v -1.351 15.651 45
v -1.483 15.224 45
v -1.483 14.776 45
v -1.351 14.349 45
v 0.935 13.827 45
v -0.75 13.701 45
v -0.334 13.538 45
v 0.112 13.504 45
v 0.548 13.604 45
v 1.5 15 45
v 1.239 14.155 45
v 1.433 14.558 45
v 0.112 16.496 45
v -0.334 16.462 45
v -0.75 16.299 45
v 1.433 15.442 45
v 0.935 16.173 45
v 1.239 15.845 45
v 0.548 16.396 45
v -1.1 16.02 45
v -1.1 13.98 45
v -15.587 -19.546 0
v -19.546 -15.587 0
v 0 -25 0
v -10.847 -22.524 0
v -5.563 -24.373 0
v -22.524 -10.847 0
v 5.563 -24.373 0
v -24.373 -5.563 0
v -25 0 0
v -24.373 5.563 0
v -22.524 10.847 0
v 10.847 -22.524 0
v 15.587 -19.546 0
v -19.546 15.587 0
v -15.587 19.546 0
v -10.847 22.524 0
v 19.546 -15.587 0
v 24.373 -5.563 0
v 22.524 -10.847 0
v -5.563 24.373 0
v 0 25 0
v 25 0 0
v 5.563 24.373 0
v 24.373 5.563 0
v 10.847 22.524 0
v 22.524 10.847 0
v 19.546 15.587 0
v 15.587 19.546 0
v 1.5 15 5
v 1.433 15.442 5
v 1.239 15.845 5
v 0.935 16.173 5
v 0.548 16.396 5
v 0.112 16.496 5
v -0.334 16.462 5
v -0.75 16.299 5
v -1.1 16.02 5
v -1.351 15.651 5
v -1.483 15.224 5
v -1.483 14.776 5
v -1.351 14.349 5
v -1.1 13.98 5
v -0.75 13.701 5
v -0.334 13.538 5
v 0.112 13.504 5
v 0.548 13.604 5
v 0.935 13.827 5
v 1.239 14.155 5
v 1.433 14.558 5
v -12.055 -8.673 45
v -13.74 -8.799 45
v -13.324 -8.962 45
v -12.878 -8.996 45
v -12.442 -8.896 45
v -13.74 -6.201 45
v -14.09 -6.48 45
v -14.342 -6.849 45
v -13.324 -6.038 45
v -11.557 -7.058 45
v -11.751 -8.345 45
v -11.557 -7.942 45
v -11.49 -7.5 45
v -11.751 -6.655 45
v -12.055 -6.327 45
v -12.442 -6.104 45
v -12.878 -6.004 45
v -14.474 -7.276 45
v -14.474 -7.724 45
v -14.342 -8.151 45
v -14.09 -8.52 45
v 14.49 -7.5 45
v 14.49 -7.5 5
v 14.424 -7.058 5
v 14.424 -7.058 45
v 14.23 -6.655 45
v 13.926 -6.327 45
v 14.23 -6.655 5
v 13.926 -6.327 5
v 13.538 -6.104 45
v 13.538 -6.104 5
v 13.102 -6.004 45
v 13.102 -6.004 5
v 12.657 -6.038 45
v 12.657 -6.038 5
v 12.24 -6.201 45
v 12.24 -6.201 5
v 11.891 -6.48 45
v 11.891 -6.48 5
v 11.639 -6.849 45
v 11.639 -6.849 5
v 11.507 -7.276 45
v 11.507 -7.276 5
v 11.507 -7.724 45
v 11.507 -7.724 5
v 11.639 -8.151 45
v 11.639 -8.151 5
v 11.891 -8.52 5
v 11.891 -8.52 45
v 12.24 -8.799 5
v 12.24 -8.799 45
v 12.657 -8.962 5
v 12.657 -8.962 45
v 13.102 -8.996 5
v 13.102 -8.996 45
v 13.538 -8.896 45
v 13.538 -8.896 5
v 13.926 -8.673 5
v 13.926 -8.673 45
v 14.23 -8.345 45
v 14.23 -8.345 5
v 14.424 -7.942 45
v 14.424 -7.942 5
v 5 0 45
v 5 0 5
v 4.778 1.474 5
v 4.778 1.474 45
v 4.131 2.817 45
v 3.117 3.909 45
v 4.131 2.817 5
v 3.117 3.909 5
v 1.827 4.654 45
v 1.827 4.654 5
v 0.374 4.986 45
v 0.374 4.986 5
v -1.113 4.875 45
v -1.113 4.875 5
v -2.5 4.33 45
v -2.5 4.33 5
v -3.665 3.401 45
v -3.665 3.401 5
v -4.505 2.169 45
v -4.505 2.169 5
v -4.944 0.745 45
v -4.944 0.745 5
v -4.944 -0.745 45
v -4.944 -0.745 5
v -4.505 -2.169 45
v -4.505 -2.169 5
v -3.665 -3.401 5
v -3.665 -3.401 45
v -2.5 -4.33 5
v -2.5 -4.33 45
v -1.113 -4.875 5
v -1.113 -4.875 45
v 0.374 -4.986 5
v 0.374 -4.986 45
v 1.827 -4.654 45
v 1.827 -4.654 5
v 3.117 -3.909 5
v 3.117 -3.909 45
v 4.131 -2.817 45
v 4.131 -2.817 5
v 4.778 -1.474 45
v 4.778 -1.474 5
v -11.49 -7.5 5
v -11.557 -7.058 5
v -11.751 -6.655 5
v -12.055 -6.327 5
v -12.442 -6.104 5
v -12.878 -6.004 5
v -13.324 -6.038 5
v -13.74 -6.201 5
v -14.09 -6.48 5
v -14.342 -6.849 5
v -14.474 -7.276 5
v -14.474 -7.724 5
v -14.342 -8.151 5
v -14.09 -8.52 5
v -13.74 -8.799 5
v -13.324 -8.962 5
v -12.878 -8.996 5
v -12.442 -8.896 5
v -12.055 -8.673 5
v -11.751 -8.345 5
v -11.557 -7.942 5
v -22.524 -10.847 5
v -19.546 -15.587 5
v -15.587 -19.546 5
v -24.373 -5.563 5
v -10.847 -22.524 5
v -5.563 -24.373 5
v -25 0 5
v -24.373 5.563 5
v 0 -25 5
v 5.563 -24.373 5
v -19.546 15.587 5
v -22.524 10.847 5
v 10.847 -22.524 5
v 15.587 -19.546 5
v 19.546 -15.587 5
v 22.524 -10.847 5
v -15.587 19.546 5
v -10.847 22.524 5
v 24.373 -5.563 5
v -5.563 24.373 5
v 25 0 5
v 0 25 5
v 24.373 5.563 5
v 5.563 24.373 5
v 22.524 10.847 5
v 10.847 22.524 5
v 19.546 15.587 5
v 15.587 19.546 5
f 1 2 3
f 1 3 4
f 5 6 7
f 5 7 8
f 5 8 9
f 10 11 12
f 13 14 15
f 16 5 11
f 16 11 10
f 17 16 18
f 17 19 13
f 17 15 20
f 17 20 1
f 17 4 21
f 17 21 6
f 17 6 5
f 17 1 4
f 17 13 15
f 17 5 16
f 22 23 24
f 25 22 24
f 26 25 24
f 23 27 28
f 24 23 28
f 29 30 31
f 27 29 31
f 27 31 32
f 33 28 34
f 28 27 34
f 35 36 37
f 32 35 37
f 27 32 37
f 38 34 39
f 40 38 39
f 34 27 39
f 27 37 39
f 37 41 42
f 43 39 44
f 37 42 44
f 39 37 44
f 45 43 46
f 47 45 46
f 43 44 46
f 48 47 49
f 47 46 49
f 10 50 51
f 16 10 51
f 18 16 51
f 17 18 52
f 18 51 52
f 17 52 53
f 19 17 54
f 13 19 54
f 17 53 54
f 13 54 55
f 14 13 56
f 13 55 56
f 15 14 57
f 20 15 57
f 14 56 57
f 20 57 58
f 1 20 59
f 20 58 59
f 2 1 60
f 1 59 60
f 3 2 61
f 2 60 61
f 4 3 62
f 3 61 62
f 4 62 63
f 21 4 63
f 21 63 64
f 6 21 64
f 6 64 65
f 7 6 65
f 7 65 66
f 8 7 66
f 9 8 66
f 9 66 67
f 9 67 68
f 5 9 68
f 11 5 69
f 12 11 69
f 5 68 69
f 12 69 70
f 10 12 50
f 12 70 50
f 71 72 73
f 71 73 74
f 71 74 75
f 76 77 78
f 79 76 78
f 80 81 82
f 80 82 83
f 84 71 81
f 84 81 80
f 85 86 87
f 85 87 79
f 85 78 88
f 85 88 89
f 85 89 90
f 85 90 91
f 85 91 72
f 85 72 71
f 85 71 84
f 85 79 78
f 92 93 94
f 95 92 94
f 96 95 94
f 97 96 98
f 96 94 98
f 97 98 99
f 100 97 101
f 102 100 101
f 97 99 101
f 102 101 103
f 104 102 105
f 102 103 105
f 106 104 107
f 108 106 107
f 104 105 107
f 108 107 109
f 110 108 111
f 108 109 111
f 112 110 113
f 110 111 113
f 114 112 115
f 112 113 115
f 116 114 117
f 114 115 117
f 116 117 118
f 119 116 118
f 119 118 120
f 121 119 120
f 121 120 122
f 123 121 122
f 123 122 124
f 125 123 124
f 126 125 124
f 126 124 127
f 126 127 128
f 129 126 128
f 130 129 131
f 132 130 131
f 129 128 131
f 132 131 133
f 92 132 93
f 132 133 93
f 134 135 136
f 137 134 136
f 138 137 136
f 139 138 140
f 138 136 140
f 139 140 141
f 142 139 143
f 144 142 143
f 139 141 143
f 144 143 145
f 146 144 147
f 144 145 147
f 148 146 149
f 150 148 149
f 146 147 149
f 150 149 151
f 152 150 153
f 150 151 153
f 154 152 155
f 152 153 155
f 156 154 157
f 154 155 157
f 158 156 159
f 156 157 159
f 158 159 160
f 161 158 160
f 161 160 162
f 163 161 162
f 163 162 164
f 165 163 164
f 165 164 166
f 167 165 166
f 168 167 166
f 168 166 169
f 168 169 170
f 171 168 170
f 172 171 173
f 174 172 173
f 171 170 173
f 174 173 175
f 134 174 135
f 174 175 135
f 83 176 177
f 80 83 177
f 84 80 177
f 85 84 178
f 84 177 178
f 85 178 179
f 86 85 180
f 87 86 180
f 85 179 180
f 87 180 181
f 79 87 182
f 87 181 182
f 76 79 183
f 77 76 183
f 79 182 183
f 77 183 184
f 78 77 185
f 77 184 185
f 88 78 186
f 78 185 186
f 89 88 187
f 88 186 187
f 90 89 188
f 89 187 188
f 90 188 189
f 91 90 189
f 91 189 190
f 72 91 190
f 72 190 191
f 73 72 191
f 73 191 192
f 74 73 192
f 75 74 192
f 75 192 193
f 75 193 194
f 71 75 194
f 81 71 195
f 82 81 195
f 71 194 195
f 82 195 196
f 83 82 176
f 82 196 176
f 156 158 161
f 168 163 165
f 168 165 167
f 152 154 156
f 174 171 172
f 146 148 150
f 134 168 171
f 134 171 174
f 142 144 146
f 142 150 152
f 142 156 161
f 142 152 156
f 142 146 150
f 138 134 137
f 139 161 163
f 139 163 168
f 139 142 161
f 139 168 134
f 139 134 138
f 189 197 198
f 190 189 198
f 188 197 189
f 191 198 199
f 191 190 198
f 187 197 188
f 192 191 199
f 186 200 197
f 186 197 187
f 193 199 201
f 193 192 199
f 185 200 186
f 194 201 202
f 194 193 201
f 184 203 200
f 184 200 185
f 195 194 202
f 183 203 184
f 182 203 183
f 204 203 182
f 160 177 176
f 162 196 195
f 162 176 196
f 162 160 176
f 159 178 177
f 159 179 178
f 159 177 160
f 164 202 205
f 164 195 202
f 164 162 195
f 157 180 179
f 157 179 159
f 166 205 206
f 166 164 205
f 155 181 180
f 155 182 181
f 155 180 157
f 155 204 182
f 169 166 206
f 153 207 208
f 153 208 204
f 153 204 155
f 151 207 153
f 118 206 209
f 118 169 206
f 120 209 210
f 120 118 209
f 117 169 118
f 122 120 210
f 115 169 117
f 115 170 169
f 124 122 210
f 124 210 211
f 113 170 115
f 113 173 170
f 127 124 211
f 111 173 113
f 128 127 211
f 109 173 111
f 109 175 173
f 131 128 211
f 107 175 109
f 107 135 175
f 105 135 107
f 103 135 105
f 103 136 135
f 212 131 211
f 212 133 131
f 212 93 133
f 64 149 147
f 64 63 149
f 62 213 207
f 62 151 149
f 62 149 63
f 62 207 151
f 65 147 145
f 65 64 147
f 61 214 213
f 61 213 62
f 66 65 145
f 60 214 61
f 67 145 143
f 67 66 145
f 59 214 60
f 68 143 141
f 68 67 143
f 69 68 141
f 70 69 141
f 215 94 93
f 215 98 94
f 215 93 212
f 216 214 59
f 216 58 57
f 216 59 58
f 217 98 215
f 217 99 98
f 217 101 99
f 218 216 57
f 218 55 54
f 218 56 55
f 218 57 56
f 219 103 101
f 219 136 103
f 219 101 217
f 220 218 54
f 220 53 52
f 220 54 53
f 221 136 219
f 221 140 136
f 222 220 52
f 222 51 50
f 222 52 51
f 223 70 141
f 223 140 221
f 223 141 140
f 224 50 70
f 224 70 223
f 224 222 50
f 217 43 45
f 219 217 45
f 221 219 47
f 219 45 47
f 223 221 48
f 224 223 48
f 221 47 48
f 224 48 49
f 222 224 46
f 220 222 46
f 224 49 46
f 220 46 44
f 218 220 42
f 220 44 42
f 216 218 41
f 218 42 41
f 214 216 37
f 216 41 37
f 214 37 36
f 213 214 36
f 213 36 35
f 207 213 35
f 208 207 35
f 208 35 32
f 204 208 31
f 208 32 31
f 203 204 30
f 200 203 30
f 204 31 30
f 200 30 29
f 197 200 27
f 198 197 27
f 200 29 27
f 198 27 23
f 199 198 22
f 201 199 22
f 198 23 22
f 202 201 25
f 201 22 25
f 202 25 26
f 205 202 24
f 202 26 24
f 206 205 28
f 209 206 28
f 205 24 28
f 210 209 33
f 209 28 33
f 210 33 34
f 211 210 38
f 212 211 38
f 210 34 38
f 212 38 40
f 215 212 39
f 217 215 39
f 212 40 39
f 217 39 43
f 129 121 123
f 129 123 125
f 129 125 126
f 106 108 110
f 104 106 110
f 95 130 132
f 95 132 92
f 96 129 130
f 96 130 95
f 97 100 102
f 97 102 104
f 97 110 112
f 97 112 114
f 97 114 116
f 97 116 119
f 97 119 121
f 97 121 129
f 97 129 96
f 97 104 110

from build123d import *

# Parameters (mm, degrees)
F0_R     = 25
F1_DEPTH = 5
F2_R     = 5
F3_DEPTH = 40
F5_R     = 1.5
F6_DEPTH = 40


with BuildPart() as f1:
    # F0 (on Top) → F1 (new body)
    with BuildSketch(Plane.XY):
        Circle(F0_R)
    extrude(amount=F1_DEPTH)

    # F2 (on face) → F3 (join)
    with BuildSketch(Plane.XY.offset(5)):
        Circle(F2_R)
    extrude(amount=F3_DEPTH)

    # F5 (on face) → F6 (join)
    with BuildSketch(Plane.XY.offset(5)):
        with Locations((0, 15)):
            Circle(F5_R)
        with Locations((12.990381, -7.5)):
            Circle(F5_R)
        with Locations((-12.990381, -7.5)):
            Circle(F5_R)
    extrude(amount=F6_DEPTH)


solid = f1.part
